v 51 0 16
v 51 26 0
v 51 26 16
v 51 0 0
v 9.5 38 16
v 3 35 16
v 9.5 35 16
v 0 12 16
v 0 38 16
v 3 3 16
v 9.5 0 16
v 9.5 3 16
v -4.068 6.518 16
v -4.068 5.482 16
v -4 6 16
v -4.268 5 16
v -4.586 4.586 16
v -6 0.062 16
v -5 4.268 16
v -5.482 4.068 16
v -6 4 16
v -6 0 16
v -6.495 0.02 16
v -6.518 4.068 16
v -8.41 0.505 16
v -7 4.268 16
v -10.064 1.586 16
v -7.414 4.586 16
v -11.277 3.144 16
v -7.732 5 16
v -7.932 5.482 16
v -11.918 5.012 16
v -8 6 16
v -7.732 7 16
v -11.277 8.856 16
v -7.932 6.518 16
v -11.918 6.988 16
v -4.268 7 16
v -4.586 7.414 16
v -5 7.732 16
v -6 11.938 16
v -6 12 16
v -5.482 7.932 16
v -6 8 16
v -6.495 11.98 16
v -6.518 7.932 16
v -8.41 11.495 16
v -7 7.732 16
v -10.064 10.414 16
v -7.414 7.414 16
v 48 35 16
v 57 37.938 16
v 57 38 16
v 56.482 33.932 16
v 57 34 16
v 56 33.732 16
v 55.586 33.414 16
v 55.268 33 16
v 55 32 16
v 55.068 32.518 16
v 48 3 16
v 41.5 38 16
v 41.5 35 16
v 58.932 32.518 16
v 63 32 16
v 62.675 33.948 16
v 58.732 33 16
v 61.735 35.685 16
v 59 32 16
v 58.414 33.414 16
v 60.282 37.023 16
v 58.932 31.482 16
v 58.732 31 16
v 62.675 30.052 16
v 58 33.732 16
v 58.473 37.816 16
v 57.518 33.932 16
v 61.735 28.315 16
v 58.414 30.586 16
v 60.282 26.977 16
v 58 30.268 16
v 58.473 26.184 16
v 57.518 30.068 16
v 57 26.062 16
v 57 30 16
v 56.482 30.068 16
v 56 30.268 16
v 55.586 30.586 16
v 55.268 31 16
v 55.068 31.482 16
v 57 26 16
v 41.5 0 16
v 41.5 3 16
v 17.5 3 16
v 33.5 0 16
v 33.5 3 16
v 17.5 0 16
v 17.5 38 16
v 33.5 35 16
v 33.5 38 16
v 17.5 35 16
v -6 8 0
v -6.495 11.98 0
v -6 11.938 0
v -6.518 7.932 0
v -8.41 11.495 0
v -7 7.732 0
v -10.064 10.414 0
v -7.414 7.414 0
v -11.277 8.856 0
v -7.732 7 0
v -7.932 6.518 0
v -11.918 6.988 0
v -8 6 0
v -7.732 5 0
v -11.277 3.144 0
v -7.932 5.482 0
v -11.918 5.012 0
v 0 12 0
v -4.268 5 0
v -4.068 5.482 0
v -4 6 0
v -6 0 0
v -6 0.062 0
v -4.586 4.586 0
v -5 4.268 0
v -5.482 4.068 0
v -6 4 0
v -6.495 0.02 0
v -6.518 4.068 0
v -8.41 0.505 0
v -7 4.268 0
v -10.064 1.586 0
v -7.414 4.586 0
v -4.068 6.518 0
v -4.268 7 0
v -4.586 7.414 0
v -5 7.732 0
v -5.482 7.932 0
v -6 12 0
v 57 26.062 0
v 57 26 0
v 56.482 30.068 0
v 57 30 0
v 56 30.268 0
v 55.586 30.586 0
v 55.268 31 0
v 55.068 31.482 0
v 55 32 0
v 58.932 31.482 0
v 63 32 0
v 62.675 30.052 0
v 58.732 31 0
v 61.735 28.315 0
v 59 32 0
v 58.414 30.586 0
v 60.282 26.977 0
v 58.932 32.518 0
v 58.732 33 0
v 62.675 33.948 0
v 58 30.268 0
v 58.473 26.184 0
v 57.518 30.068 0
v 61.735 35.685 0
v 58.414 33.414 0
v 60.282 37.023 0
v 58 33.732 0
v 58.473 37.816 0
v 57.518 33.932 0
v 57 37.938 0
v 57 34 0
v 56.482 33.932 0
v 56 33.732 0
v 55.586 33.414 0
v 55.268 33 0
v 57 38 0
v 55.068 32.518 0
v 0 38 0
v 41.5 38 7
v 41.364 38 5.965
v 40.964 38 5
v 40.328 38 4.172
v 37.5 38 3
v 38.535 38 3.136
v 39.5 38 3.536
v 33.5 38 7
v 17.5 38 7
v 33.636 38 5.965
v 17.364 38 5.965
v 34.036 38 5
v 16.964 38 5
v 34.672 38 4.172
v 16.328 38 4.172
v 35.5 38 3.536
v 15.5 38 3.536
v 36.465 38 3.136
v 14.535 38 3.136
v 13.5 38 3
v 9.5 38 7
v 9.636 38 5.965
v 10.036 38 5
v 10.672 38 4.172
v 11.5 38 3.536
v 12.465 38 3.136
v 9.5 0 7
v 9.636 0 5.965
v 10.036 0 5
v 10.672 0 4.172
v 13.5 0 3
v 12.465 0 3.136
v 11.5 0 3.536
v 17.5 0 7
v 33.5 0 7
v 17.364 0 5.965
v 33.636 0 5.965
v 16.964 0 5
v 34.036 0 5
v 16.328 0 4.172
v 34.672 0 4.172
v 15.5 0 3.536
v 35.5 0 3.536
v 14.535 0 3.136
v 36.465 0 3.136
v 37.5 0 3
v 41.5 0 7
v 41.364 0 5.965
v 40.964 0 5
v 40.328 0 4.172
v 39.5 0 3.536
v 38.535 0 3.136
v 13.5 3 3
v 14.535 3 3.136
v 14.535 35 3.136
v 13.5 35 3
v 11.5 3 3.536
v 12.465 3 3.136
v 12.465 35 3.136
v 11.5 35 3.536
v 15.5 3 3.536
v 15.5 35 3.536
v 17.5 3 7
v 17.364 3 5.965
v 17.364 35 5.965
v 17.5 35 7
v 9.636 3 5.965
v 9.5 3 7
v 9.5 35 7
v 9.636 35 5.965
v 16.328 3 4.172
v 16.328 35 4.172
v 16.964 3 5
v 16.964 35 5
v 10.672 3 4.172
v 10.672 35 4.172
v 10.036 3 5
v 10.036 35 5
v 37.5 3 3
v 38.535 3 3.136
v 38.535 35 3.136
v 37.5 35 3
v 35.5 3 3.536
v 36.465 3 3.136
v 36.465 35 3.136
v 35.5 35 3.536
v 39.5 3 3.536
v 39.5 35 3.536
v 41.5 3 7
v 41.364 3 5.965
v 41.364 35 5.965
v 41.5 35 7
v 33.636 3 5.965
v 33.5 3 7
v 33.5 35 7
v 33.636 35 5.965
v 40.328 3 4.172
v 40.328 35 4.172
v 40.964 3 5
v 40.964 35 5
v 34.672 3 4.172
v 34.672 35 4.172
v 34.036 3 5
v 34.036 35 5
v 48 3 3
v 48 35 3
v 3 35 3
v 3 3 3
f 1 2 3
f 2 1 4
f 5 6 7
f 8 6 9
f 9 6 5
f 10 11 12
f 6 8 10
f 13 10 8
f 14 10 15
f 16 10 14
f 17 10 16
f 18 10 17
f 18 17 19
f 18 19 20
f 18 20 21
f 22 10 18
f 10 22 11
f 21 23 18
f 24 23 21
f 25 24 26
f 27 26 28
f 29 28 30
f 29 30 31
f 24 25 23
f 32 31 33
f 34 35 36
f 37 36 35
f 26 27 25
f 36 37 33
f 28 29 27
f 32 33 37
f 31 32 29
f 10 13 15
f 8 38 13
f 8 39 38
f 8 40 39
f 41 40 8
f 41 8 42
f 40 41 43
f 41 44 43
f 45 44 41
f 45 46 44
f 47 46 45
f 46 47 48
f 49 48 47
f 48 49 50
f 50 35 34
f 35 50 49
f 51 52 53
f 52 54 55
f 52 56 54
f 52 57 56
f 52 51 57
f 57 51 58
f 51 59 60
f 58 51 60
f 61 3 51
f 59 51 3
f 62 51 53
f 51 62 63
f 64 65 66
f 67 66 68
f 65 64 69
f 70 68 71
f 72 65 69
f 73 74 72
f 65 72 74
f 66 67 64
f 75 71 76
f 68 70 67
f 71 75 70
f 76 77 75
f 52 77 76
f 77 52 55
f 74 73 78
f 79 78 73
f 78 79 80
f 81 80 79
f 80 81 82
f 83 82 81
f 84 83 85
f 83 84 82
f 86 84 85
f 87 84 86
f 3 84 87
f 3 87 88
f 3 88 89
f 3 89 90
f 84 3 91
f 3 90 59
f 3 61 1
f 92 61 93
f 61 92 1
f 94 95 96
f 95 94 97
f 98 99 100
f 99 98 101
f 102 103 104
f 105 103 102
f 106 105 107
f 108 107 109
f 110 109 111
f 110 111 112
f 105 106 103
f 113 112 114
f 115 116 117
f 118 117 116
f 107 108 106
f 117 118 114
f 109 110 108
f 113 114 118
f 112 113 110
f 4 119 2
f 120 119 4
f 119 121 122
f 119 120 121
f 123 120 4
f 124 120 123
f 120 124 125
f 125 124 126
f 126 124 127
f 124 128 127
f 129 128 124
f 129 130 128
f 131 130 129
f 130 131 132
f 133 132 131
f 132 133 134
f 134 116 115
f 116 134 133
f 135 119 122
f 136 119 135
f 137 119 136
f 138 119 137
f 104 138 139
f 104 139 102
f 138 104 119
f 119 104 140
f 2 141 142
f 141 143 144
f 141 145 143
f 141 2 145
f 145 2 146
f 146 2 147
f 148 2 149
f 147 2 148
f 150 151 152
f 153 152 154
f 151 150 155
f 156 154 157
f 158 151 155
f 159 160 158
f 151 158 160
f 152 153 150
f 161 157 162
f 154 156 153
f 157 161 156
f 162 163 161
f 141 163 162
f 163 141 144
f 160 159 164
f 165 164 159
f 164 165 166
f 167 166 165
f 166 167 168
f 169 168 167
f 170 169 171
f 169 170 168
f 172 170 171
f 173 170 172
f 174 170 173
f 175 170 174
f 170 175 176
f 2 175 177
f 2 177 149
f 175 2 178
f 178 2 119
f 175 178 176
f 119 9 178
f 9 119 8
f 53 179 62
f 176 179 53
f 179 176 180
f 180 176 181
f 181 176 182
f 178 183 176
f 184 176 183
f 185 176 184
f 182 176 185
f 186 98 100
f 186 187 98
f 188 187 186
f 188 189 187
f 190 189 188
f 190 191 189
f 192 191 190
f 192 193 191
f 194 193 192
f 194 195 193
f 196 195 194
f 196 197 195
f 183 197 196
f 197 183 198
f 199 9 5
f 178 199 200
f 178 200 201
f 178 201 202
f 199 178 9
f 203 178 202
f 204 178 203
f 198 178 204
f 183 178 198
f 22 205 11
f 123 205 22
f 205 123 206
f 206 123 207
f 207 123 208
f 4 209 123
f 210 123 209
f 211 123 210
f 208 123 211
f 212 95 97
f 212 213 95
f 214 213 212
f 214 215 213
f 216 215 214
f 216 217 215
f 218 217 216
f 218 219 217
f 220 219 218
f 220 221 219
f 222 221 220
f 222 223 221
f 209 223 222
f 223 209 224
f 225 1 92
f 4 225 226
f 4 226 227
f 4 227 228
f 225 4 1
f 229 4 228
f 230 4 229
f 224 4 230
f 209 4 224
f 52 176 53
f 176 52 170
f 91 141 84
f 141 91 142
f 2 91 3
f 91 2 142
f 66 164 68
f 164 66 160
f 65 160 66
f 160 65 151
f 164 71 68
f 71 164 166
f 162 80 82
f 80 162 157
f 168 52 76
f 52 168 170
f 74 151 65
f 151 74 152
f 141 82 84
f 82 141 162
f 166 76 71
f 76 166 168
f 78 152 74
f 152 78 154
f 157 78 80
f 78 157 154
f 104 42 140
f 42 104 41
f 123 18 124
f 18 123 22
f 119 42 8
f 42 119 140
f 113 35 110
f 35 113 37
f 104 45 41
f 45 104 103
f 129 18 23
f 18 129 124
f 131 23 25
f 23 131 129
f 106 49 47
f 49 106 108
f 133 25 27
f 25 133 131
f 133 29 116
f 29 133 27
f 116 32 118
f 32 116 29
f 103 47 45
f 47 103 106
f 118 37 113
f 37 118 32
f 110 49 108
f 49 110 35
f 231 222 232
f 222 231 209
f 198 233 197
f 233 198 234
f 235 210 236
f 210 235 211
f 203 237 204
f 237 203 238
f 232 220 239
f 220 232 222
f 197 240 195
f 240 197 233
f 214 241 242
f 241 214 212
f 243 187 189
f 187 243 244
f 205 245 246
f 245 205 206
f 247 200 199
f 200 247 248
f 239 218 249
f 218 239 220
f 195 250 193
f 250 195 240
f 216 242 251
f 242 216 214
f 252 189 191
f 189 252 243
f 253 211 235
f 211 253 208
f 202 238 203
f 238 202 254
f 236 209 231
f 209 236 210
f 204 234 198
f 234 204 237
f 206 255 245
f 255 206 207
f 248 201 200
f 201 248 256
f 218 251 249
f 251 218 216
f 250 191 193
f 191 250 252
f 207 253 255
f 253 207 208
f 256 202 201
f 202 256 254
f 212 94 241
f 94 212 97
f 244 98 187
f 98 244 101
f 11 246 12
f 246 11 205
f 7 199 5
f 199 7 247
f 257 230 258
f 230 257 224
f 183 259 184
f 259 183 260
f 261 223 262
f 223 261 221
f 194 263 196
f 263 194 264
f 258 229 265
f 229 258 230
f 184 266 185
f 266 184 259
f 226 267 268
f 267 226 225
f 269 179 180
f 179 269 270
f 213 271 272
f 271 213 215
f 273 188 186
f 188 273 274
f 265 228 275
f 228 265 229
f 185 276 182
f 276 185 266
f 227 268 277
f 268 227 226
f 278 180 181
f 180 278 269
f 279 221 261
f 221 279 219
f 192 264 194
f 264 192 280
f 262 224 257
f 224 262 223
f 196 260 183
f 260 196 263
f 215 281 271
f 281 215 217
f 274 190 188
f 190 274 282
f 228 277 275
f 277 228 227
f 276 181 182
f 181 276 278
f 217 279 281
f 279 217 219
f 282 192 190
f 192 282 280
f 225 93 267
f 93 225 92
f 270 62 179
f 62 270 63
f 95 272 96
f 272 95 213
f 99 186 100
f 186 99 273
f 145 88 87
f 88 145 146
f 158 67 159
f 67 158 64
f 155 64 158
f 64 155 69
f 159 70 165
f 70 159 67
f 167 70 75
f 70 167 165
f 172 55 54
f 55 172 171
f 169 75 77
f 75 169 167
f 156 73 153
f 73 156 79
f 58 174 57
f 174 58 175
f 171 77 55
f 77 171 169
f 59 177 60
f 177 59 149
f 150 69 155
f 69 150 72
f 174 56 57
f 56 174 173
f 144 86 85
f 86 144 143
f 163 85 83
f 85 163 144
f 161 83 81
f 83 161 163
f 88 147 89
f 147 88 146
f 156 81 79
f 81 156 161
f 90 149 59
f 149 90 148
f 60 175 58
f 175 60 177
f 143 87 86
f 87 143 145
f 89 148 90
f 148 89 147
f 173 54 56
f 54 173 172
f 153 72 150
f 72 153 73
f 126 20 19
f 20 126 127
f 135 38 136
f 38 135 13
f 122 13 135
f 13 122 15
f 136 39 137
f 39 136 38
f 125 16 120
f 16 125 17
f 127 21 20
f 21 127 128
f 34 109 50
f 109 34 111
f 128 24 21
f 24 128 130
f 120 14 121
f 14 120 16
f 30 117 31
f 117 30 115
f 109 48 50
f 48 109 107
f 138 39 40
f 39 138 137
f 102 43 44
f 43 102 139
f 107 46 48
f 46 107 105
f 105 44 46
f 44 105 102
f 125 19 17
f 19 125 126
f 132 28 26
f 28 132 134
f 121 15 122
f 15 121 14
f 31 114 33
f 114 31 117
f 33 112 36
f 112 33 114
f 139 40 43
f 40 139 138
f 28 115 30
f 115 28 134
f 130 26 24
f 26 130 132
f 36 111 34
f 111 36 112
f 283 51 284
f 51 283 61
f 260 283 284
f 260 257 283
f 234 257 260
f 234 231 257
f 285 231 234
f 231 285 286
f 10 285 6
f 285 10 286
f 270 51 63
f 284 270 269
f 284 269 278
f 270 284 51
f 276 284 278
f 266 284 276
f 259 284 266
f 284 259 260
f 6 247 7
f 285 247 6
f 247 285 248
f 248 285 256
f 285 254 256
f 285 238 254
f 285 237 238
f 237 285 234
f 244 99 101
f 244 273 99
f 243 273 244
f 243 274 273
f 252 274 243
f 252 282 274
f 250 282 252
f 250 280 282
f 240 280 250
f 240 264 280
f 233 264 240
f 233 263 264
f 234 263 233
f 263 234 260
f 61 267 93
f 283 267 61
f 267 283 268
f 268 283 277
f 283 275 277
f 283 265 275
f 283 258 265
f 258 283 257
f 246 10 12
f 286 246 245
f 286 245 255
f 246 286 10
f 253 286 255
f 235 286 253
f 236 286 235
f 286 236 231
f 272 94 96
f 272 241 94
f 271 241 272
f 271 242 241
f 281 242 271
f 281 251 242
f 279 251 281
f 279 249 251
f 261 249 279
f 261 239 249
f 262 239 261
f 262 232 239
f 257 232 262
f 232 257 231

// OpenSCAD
// number of relay insets
relays = 2;

// dimensions of relay body
relay_x = 21;
relay_y = 32;
relay_z = 18;

// inset of terminals from body end, edge to center
terminal_offset = 7.5;

// thickness of side, top, divider walls
wall_thickness = 3;

// cover specs
cover_height = 16;
cover_screw_diameter = 3;
pass_through_width = 8;

// terminal holes
// set to "rect" and set x,y, or set to "round" and set diameter d
// logic checks for "rect" and sets to round for anything else
// ignores irrelevant value set
bottom_hole = "round";
bottom_hole_x = 13;
bottom_hole_y = 10;
bottom_hole_d = 12;

top_hole = "rect";
top_hole_x = 13;
top_hole_y = 10;
top_hole_d = 12;

// mounting tabs width
mounting_tab_width = 12;
// screw hole diameters
mounting_screw_diameter = 4;


// uncomment the part you want to render
//baseplate();
//holder();
cover();

overall_x = relays * relay_x + wall_thickness*(relays+1);
overall_y = relay_y+2*wall_thickness;
overall_z = relay_z+wall_thickness;

module cover() {
rotate([0,0,0]) {
    difference() {
    union() {
        // main body
        cube([overall_x,overall_y,cover_height]);
        
        //cover tabs
        translate([overall_x-mounting_tab_width/2,overall_y-mounting_tab_width,0])
        cube([mounting_tab_width,mounting_tab_width,cover_height]);
        translate([overall_x+mounting_tab_width/2,overall_y-mounting_tab_width/2,0])
        cylinder(d=mounting_tab_width,h=cover_height);
        
        translate([-mounting_tab_width/2,0,0])
        cube([mounting_tab_width,mounting_tab_width,cover_height]);
        translate([-mounting_tab_width/2,mounting_tab_width/2,0])
        cylinder(d=mounting_tab_width,h=cover_height);
    }
    
    // cover holes
    // bumped out 1mm in diameter to accommodate top of screw
    translate([overall_x+mounting_tab_width/2,overall_y-mounting_tab_width/2,-1])
    cylinder(d=cover_screw_diameter+1,h=cover_height+2,$fn=24);
    translate([-mounting_tab_width/2,mounting_tab_width/2,-1])
    cylinder(d=cover_screw_diameter+1,h=cover_height+2,$fn=24);
    
    
    // main cavity
    translate([wall_thickness,wall_thickness,wall_thickness])
    cube([overall_x-2*wall_thickness,overall_y-2*wall_thickness,cover_height]);
    
    //wire pass-throughs
    for (i=[0:1:relays-1]) {
        // calculate offsets
        x_offset = i*(relay_x+wall_thickness)+wall_thickness;
        centerline = x_offset+relay_x/2;
        
        translate([centerline,overall_y+1,wall_thickness+pass_through_width/2])
        rotate([90,0,0])
        cylinder(d=pass_through_width,h=overall_y+2,$fn=24);
        
        translate([centerline-pass_through_width/2,-1,wall_thickness+pass_through_width/2])
        cube([pass_through_width,overall_y+2,cover_height]);
        
        
        
    }
    
}
}
}



module holder() {
rotate([180,0,0]) {
    difference() {
    union() {
        // main body
        cube([overall_x,overall_y,overall_z]);
        // mounting tabs
        translate([-mounting_tab_width/2,0,0])
        cube([mounting_tab_width,mounting_tab_width,overall_z]);
        translate([-mounting_tab_width/2,mounting_tab_width/2,0])
        cylinder(d=mounting_tab_width,h=overall_z);
        translate([overall_x-mounting_tab_width/2,overall_y-mounting_tab_width,0])
        cube([mounting_tab_width,mounting_tab_width,overall_z]);
        translate([overall_x+mounting_tab_width/2,overall_y-mounting_tab_width/2,0])
        cylinder(d=mounting_tab_width,h=overall_z);
        
        //cover tabs
        translate([overall_x-mounting_tab_width/2,0,overall_z-10])
        cube([mounting_tab_width,mounting_tab_width,10]);
        translate([overall_x+mounting_tab_width/2,mounting_tab_width/2,overall_z-10])
        cylinder(d=mounting_tab_width,h=10);
        translate([-mounting_tab_width/2,overall_y-mounting_tab_width,overall_z-10])
        cube([mounting_tab_width,mounting_tab_width,10]);
        translate([-mounting_tab_width/2,overall_y-mounting_tab_width/2,overall_z-10])
        cylinder(d=mounting_tab_width,h=10);
    }
    //mounting holes
    translate([-mounting_tab_width/2,mounting_tab_width/2,-1])
    cylinder(d=mounting_screw_diameter,h=overall_z+2,$fn=24);
    translate([overall_x+mounting_tab_width/2,overall_y-mounting_tab_width/2,-1])
    cylinder(d=mounting_screw_diameter,h=overall_z+2,$fn=24);
    
    // cover holes
    translate([overall_x+mounting_tab_width/2,mounting_tab_width/2,-1])
    cylinder(d=cover_screw_diameter,h=overall_z+2,$fn=24);
    translate([-mounting_tab_width/2,overall_y-mounting_tab_width/2,-1])
    cylinder(d=cover_screw_diameter,h=overall_z+2,$fn=24);
    
    
    //relay slots and terminal holes
    for (i=[0:1:relays-1]) {
        // relay body sockets
        x_offset = i*(relay_x+wall_thickness)+wall_thickness;
        centerline = x_offset+relay_x/2;
        translate([x_offset,wall_thickness,-1])
        cube([relay_x,relay_y,relay_z+1]);
        
        // bottom holes
        if (bottom_hole == "rect") {
            translate([centerline-bottom_hole_x/2,wall_thickness + terminal_offset - bottom_hole_y/2,-1])
            cube([bottom_hole_x,bottom_hole_y,overall_z+2]);
        }
        else {
            // assumes round hole
             translate([centerline,wall_thickness + terminal_offset,-1])
            cylinder(d=bottom_hole_d, h=overall_z+2);
        }
        
        // top holes
        if (top_hole == "rect") {
            translate([centerline-top_hole_x/2,overall_y-wall_thickness-terminal_offset-top_hole_y/2,-1])
            cube([top_hole_x,top_hole_y,overall_z+2]);
        }
        else {
            // assumes round hole
             translate([centerline,overall_y-wall_thickness-terminal_offset,-1])
            cylinder(d=top_hole_d, h=overall_z+2);
        }
    }
    
}
}
}


module baseplate() {
rotate([180,0,0])    
difference() {
    union() {
        cube([overall_x,overall_y,wall_thickness]);
        translate([-mounting_tab_width/2,0,0])
        cube([mounting_tab_width,mounting_tab_width,wall_thickness]);
        translate([-mounting_tab_width/2,mounting_tab_width/2,0])
        cylinder(d=mounting_tab_width,h=wall_thickness);
        translate([overall_x-mounting_tab_width/2,overall_y-mounting_tab_width,0])
        cube([mounting_tab_width,mounting_tab_width,wall_thickness]);
        translate([overall_x+mounting_tab_width/2,overall_y-mounting_tab_width/2,0])
        cylinder(d=mounting_tab_width,h=wall_thickness);
    }
    translate([-mounting_tab_width/2,mounting_tab_width/2,-1])
    cylinder(d=mounting_screw_diameter,h=mounting_tab_width/2,$fn=24);
    translate([overall_x+mounting_tab_width/2,overall_y-mounting_tab_width/2,-1])
    cylinder(d=mounting_screw_diameter,h=mounting_tab_width/2,$fn=24);
}
}
